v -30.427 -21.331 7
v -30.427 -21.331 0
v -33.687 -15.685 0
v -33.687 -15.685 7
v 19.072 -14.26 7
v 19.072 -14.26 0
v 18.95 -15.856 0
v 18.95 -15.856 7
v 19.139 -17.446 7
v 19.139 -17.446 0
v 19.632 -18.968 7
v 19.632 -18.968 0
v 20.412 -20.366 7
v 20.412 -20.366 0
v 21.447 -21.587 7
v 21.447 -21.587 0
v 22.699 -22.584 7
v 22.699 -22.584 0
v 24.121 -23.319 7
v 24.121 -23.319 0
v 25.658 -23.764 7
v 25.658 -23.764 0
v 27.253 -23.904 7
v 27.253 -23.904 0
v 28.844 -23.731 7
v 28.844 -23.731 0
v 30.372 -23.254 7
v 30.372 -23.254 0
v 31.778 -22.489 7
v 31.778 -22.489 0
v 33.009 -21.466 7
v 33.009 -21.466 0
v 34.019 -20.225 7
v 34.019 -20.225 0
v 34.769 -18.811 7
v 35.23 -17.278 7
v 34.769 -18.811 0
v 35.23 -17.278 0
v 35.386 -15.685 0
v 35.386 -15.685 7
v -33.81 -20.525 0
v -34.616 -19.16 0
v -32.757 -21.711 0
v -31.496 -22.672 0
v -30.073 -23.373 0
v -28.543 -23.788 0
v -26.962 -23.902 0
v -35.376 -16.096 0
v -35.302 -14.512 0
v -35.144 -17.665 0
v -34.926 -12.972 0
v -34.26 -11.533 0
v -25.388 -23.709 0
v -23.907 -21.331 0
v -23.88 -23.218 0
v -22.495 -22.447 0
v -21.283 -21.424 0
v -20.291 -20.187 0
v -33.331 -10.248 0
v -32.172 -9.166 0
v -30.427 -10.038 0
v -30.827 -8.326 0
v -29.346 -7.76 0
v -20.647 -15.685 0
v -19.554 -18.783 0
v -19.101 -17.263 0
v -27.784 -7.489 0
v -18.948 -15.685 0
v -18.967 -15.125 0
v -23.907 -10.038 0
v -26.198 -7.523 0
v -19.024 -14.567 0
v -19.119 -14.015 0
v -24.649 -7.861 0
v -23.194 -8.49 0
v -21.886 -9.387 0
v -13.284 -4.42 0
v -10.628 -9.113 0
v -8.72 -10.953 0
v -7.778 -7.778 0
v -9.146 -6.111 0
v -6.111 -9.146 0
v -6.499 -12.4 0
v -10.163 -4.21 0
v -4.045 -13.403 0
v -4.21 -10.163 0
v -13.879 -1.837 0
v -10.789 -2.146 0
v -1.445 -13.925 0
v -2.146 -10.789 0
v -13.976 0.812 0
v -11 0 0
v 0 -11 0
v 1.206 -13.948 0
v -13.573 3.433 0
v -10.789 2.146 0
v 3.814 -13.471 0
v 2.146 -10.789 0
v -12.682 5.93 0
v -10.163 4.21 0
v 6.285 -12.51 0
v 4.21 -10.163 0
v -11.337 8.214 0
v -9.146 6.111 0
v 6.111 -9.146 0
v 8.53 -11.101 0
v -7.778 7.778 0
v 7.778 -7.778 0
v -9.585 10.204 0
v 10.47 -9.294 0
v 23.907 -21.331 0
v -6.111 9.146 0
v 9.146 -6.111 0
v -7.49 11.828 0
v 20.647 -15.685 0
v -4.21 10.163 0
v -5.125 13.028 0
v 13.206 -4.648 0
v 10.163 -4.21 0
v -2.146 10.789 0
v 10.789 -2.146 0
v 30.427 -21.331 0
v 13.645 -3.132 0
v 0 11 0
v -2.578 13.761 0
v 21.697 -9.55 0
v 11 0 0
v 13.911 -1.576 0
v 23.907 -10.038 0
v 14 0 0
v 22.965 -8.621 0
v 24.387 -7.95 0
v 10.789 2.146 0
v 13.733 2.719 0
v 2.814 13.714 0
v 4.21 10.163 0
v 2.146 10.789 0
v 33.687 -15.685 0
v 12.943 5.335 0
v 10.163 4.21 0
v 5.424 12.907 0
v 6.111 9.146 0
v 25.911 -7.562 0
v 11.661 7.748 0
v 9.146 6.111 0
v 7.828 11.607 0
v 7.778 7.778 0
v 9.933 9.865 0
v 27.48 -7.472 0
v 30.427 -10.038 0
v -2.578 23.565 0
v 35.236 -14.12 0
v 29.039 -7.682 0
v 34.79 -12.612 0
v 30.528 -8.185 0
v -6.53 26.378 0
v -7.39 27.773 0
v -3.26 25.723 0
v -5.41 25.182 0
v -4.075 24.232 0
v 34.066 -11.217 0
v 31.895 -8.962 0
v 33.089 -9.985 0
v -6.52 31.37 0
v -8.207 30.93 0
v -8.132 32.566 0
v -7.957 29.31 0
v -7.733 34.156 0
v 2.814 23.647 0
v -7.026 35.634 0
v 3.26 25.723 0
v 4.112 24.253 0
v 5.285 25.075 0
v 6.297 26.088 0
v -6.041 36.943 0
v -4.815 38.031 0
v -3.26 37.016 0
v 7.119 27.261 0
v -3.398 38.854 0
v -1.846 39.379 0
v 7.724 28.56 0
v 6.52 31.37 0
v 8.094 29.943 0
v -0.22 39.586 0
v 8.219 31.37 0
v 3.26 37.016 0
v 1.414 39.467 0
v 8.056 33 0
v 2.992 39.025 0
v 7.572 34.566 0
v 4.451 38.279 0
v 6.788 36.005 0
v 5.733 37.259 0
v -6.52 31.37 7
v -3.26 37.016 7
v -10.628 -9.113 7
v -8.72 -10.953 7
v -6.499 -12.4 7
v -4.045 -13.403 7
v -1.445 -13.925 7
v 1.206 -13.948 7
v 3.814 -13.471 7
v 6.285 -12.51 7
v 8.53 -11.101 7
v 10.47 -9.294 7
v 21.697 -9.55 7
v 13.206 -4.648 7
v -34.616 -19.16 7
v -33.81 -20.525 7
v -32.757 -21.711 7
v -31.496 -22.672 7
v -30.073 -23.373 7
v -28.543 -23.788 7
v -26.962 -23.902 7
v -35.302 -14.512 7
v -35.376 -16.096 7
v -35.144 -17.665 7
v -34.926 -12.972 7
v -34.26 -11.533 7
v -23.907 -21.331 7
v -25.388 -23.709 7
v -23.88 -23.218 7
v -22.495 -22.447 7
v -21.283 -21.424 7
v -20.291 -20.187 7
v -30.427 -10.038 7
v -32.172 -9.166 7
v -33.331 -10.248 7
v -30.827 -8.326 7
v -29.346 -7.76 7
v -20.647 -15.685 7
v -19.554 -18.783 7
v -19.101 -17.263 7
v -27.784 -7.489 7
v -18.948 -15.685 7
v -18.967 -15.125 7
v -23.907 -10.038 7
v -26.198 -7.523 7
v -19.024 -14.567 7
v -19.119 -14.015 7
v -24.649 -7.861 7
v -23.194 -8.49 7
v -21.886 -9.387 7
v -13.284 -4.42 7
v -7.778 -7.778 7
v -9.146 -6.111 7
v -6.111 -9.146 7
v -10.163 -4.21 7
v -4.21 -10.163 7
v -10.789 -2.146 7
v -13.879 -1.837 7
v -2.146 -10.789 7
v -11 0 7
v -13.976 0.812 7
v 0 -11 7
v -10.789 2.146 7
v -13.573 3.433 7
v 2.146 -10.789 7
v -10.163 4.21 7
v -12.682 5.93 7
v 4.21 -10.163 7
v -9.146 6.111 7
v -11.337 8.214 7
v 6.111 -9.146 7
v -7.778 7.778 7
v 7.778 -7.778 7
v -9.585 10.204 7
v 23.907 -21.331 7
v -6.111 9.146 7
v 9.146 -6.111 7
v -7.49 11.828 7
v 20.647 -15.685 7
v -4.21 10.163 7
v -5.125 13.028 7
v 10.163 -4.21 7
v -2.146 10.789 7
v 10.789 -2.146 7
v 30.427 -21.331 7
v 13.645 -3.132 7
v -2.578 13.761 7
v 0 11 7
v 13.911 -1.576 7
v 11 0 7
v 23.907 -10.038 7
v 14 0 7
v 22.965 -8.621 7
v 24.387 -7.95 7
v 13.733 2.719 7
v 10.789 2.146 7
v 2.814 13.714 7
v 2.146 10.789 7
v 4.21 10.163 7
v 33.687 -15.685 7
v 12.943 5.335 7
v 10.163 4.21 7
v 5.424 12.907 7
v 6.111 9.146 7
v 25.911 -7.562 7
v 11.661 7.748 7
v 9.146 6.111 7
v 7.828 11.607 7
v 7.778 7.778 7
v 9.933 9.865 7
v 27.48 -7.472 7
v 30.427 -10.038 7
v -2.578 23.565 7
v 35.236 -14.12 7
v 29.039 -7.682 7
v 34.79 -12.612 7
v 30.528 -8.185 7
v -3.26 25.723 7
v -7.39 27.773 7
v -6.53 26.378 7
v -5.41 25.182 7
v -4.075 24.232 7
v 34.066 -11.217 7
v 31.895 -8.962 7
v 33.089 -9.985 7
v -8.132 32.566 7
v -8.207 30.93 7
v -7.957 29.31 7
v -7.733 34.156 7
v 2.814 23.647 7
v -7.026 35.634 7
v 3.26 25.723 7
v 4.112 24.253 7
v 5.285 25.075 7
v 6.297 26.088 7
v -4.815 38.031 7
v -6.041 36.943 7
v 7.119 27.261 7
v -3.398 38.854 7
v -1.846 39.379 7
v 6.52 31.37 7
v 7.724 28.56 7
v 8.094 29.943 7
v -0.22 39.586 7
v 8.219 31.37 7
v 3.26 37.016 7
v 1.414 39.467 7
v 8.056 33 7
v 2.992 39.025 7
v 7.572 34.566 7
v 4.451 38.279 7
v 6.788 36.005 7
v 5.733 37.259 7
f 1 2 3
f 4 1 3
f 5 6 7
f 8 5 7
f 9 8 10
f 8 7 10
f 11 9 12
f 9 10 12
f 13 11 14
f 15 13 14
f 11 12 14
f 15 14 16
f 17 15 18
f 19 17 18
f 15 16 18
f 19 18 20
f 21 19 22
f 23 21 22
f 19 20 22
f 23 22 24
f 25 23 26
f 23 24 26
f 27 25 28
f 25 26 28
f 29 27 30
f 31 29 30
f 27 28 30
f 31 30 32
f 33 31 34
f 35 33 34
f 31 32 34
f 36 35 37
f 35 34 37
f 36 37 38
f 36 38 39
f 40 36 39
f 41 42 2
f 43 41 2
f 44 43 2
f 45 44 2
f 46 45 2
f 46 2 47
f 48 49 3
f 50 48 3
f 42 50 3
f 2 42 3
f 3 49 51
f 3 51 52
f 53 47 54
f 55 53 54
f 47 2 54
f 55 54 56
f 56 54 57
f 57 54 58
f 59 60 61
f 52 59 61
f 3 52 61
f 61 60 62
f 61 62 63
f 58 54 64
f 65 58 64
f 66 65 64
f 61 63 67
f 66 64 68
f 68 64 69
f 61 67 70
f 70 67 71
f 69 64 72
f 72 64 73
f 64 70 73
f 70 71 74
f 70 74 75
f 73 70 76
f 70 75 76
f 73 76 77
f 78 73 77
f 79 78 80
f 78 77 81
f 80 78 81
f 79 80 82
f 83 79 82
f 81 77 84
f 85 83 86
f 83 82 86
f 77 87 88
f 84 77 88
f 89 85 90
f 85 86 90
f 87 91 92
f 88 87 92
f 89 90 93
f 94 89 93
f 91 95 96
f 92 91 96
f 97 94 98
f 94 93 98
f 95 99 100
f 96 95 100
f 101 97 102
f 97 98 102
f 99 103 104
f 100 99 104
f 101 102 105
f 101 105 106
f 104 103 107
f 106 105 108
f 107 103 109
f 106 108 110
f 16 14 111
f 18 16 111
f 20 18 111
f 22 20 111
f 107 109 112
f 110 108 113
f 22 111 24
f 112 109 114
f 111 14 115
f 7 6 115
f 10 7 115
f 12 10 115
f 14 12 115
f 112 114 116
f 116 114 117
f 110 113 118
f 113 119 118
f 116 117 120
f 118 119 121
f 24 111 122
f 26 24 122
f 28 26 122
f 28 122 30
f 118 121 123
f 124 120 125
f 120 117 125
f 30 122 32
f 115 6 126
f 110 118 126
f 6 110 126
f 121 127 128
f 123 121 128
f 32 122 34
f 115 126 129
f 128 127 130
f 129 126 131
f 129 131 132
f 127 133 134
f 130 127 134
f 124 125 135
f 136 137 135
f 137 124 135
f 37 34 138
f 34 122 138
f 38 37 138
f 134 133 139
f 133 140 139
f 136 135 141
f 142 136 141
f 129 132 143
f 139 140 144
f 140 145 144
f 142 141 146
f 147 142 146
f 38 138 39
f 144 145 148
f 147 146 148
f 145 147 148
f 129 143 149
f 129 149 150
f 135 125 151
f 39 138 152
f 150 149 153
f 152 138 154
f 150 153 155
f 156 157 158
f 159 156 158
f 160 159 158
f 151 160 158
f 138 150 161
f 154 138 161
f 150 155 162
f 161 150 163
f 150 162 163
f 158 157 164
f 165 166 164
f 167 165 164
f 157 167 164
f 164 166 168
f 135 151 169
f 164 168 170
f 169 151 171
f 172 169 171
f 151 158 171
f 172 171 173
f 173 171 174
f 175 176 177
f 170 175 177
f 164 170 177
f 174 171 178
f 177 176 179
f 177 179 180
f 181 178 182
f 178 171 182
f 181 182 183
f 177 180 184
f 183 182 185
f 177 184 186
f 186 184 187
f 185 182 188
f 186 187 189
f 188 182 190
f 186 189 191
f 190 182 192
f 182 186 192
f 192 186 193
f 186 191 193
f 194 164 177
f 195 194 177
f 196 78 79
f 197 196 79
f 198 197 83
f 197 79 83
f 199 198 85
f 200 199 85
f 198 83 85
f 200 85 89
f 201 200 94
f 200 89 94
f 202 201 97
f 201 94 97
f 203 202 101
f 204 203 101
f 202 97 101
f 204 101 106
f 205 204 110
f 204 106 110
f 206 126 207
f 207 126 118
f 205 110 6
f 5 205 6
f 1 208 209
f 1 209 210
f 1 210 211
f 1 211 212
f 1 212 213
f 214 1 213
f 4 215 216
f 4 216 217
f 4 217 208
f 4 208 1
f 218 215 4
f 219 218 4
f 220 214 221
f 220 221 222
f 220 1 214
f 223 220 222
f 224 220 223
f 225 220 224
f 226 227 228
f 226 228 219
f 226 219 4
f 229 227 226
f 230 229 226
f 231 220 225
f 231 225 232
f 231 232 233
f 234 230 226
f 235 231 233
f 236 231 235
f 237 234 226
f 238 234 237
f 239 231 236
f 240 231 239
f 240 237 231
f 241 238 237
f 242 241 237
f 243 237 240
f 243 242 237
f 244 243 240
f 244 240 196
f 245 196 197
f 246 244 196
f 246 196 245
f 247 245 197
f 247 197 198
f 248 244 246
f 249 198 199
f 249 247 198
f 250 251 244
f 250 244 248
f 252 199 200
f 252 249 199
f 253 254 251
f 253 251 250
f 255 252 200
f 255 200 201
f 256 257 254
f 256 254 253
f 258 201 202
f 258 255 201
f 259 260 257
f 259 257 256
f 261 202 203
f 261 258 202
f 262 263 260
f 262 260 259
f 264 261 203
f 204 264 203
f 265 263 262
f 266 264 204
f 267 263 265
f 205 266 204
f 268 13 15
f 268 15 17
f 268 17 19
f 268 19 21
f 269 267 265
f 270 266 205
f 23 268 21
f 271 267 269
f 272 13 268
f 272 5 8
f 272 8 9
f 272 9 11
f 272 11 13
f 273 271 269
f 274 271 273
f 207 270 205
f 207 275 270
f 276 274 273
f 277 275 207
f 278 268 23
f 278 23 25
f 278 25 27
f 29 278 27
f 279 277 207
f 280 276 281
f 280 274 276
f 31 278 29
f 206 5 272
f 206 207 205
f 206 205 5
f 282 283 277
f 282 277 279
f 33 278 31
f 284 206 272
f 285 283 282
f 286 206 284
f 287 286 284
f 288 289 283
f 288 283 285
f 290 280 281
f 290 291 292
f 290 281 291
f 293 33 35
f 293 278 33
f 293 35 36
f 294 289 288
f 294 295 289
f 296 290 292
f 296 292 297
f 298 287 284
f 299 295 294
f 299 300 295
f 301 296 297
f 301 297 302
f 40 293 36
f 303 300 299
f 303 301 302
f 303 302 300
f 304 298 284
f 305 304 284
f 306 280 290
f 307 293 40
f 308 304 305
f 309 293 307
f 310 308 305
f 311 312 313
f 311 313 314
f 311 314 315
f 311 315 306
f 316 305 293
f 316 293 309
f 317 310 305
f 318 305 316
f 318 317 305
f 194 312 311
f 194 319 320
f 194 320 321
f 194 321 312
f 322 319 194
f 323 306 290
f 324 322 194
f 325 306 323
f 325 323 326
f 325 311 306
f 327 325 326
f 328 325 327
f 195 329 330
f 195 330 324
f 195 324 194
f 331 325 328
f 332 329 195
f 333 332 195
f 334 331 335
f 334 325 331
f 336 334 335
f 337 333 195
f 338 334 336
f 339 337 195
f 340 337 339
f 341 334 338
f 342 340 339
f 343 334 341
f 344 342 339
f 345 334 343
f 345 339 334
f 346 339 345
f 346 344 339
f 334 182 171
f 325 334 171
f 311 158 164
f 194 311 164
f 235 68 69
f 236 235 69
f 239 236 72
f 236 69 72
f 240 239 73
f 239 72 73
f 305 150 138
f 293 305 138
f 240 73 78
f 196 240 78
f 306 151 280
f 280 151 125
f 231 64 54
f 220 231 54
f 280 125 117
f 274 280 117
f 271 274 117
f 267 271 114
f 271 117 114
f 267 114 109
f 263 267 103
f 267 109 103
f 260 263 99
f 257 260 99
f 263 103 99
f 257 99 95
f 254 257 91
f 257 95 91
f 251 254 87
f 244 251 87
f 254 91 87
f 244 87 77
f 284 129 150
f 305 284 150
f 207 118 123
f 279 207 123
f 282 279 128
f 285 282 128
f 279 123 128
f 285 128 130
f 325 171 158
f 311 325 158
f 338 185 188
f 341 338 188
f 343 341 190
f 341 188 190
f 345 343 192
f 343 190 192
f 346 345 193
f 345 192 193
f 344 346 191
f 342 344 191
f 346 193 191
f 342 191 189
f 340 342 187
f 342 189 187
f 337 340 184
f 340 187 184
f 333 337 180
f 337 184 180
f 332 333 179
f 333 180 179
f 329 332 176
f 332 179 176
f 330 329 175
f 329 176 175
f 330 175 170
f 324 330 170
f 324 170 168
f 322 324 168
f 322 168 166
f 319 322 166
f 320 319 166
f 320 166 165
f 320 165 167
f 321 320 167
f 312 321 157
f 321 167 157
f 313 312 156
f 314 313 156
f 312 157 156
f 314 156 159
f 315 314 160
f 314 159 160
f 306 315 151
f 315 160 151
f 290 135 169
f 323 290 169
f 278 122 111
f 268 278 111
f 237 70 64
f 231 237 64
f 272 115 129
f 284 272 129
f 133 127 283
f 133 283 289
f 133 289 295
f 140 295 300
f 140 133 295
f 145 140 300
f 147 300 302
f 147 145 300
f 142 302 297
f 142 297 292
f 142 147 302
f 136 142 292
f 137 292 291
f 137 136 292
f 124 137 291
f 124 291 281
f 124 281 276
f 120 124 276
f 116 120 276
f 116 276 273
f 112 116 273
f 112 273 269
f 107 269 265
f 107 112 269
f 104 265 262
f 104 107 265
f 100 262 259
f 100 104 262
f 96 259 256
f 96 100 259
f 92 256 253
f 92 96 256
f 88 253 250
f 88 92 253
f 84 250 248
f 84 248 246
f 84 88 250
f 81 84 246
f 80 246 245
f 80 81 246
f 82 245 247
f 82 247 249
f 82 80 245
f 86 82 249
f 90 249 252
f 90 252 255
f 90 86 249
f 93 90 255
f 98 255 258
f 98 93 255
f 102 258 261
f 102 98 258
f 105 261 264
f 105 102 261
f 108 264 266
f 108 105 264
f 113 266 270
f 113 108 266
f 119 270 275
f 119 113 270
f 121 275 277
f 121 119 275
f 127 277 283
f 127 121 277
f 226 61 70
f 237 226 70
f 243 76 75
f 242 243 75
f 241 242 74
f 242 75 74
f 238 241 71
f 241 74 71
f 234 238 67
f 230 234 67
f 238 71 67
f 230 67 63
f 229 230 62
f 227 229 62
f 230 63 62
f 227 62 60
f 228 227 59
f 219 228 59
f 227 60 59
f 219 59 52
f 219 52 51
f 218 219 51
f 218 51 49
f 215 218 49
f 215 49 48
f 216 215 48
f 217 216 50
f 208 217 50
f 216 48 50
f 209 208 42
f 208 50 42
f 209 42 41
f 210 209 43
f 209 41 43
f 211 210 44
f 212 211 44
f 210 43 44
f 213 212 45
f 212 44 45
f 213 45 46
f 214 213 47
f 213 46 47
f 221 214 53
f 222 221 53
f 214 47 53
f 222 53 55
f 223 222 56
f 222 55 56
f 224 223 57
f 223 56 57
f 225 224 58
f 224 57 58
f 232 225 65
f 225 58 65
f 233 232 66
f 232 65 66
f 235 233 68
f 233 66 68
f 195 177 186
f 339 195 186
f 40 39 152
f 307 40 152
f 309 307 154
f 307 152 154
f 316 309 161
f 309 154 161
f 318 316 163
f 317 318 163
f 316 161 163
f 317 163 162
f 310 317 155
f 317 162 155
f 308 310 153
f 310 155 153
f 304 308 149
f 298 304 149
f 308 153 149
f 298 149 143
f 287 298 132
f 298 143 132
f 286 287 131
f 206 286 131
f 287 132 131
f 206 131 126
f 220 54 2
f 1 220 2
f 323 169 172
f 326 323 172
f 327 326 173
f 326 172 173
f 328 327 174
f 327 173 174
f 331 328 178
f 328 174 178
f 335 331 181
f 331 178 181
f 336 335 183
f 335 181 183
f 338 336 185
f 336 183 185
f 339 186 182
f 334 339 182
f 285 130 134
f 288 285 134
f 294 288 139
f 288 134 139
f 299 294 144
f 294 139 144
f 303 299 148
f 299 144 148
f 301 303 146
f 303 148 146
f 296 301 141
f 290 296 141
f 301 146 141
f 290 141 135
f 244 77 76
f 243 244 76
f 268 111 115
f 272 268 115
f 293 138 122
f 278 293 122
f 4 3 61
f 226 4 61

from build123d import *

# Parameters (mm, degrees)
F0_R     = 11
F1_DEPTH = 7


with BuildPart() as f1:
    # F0 (on Top) → F1 (new body)
    with BuildSketch(Plane.XY):
        with BuildLine():
            ThreePointArc((-2.577571, 23.56544), (0.124952, 23.151761), (2.813649, 23.647409))
            ThreePointArc((2.813649, 23.647409), (6.73351, 26.656757), (8.219155, 31.369967))
            ThreePointArc((8.219155, 31.369967), (-4.815031, 38.031046), (-2.577571, 23.56544))
        make_face()
        Polygon((6.520027, 31.369967), (3.260014, 25.723457), (-3.260014, 25.723457), (-6.520027, 31.369967), (-3.260014, 37.016476), (3.260014, 37.016476), align=None, mode=Mode.SUBTRACT)
        with BuildLine():
            ThreePointArc((-2.577571, 13.760673), (0.12029, 13.999483), (2.813649, 13.714349))
            Line((2.813649, 13.714349), (2.813649, 23.647409))
            ThreePointArc((2.813649, 23.647409), (0.124952, 23.151761), (-2.577571, 23.56544))
            Line((-2.577571, 23.56544), (-2.577571, 13.760673))
        make_face()
        with BuildLine():
            ThreePointArc((13.205878, -4.648095), (13.800042, -2.357722), (14, 0))
            ThreePointArc((14, 0), (10.848758, 8.848981), (2.813649, 13.714349))
            ThreePointArc((2.813649, 13.714349), (0.12029, 13.999483), (-2.577571, 13.760673))
            ThreePointArc((-2.577571, 13.760673), (-12.063763, 7.103916), (-13.283799, -4.420483))
            ThreePointArc((-13.283799, -4.420483), (-12.184053, -6.895568), (-10.628307, -9.112579))
            ThreePointArc((-10.628307, -9.112579), (-0.12029, -13.999483), (10.470151, -9.293866))
            ThreePointArc((10.470151, -9.293866), (12.063763, -7.103916), (13.205878, -4.648095))
        make_face()
        Circle(F0_R, mode=Mode.SUBTRACT)
        with BuildLine():
            ThreePointArc((-10.628307, -9.112579), (-12.184053, -6.895568), (-13.283799, -4.420483))
            Line((-13.283799, -4.420483), (-21.886082, -9.387013))
            ThreePointArc((-21.886082, -9.387013), (-20.112489, -11.467669), (-19.119484, -14.014962))
            Line((-19.119484, -14.014962), (-10.628307, -9.112579))
        make_face()
        with BuildLine():
            ThreePointArc((-19.119484, -14.014962), (-20.112489, -11.467669), (-21.886082, -9.387013))
            ThreePointArc((-21.886082, -9.387013), (-34.615703, -19.159769), (-18.948033, -15.684983))
            ThreePointArc((-18.948033, -15.684983), (-18.991008, -14.845584), (-19.119484, -14.014962))
        make_face()
        Polygon((-30.427202, -10.038474), (-23.907174, -10.038474), (-20.647161, -15.684983), (-23.907174, -21.331493), (-30.427202, -21.331493), (-33.687215, -15.684983), align=None, mode=Mode.SUBTRACT)
        with BuildLine():
            Line((21.697055, -9.550478), (13.205878, -4.648095))
            ThreePointArc((13.205878, -4.648095), (12.063763, -7.103916), (10.470151, -9.293866))
            Line((10.470151, -9.293866), (19.072433, -14.260396))
            ThreePointArc((19.072433, -14.260396), (19.987538, -11.684092), (21.697055, -9.550478))
        make_face()
        with BuildLine():
            ThreePointArc((35.386343, -15.684983), (30.528337, -8.184504), (21.697055, -9.550478))
            ThreePointArc((21.697055, -9.550478), (19.987538, -11.684092), (19.072433, -14.260396))
            ThreePointArc((19.072433, -14.260396), (26.452184, -23.872979), (35.386343, -15.684983))
        make_face()
        Polygon((23.907174, -21.331493), (20.647161, -15.684983), (23.907174, -10.038474), (30.427202, -10.038474), (33.687215, -15.684983), (30.427202, -21.331493), align=None, mode=Mode.SUBTRACT)
    extrude(amount=F1_DEPTH)


solid = f1.part
